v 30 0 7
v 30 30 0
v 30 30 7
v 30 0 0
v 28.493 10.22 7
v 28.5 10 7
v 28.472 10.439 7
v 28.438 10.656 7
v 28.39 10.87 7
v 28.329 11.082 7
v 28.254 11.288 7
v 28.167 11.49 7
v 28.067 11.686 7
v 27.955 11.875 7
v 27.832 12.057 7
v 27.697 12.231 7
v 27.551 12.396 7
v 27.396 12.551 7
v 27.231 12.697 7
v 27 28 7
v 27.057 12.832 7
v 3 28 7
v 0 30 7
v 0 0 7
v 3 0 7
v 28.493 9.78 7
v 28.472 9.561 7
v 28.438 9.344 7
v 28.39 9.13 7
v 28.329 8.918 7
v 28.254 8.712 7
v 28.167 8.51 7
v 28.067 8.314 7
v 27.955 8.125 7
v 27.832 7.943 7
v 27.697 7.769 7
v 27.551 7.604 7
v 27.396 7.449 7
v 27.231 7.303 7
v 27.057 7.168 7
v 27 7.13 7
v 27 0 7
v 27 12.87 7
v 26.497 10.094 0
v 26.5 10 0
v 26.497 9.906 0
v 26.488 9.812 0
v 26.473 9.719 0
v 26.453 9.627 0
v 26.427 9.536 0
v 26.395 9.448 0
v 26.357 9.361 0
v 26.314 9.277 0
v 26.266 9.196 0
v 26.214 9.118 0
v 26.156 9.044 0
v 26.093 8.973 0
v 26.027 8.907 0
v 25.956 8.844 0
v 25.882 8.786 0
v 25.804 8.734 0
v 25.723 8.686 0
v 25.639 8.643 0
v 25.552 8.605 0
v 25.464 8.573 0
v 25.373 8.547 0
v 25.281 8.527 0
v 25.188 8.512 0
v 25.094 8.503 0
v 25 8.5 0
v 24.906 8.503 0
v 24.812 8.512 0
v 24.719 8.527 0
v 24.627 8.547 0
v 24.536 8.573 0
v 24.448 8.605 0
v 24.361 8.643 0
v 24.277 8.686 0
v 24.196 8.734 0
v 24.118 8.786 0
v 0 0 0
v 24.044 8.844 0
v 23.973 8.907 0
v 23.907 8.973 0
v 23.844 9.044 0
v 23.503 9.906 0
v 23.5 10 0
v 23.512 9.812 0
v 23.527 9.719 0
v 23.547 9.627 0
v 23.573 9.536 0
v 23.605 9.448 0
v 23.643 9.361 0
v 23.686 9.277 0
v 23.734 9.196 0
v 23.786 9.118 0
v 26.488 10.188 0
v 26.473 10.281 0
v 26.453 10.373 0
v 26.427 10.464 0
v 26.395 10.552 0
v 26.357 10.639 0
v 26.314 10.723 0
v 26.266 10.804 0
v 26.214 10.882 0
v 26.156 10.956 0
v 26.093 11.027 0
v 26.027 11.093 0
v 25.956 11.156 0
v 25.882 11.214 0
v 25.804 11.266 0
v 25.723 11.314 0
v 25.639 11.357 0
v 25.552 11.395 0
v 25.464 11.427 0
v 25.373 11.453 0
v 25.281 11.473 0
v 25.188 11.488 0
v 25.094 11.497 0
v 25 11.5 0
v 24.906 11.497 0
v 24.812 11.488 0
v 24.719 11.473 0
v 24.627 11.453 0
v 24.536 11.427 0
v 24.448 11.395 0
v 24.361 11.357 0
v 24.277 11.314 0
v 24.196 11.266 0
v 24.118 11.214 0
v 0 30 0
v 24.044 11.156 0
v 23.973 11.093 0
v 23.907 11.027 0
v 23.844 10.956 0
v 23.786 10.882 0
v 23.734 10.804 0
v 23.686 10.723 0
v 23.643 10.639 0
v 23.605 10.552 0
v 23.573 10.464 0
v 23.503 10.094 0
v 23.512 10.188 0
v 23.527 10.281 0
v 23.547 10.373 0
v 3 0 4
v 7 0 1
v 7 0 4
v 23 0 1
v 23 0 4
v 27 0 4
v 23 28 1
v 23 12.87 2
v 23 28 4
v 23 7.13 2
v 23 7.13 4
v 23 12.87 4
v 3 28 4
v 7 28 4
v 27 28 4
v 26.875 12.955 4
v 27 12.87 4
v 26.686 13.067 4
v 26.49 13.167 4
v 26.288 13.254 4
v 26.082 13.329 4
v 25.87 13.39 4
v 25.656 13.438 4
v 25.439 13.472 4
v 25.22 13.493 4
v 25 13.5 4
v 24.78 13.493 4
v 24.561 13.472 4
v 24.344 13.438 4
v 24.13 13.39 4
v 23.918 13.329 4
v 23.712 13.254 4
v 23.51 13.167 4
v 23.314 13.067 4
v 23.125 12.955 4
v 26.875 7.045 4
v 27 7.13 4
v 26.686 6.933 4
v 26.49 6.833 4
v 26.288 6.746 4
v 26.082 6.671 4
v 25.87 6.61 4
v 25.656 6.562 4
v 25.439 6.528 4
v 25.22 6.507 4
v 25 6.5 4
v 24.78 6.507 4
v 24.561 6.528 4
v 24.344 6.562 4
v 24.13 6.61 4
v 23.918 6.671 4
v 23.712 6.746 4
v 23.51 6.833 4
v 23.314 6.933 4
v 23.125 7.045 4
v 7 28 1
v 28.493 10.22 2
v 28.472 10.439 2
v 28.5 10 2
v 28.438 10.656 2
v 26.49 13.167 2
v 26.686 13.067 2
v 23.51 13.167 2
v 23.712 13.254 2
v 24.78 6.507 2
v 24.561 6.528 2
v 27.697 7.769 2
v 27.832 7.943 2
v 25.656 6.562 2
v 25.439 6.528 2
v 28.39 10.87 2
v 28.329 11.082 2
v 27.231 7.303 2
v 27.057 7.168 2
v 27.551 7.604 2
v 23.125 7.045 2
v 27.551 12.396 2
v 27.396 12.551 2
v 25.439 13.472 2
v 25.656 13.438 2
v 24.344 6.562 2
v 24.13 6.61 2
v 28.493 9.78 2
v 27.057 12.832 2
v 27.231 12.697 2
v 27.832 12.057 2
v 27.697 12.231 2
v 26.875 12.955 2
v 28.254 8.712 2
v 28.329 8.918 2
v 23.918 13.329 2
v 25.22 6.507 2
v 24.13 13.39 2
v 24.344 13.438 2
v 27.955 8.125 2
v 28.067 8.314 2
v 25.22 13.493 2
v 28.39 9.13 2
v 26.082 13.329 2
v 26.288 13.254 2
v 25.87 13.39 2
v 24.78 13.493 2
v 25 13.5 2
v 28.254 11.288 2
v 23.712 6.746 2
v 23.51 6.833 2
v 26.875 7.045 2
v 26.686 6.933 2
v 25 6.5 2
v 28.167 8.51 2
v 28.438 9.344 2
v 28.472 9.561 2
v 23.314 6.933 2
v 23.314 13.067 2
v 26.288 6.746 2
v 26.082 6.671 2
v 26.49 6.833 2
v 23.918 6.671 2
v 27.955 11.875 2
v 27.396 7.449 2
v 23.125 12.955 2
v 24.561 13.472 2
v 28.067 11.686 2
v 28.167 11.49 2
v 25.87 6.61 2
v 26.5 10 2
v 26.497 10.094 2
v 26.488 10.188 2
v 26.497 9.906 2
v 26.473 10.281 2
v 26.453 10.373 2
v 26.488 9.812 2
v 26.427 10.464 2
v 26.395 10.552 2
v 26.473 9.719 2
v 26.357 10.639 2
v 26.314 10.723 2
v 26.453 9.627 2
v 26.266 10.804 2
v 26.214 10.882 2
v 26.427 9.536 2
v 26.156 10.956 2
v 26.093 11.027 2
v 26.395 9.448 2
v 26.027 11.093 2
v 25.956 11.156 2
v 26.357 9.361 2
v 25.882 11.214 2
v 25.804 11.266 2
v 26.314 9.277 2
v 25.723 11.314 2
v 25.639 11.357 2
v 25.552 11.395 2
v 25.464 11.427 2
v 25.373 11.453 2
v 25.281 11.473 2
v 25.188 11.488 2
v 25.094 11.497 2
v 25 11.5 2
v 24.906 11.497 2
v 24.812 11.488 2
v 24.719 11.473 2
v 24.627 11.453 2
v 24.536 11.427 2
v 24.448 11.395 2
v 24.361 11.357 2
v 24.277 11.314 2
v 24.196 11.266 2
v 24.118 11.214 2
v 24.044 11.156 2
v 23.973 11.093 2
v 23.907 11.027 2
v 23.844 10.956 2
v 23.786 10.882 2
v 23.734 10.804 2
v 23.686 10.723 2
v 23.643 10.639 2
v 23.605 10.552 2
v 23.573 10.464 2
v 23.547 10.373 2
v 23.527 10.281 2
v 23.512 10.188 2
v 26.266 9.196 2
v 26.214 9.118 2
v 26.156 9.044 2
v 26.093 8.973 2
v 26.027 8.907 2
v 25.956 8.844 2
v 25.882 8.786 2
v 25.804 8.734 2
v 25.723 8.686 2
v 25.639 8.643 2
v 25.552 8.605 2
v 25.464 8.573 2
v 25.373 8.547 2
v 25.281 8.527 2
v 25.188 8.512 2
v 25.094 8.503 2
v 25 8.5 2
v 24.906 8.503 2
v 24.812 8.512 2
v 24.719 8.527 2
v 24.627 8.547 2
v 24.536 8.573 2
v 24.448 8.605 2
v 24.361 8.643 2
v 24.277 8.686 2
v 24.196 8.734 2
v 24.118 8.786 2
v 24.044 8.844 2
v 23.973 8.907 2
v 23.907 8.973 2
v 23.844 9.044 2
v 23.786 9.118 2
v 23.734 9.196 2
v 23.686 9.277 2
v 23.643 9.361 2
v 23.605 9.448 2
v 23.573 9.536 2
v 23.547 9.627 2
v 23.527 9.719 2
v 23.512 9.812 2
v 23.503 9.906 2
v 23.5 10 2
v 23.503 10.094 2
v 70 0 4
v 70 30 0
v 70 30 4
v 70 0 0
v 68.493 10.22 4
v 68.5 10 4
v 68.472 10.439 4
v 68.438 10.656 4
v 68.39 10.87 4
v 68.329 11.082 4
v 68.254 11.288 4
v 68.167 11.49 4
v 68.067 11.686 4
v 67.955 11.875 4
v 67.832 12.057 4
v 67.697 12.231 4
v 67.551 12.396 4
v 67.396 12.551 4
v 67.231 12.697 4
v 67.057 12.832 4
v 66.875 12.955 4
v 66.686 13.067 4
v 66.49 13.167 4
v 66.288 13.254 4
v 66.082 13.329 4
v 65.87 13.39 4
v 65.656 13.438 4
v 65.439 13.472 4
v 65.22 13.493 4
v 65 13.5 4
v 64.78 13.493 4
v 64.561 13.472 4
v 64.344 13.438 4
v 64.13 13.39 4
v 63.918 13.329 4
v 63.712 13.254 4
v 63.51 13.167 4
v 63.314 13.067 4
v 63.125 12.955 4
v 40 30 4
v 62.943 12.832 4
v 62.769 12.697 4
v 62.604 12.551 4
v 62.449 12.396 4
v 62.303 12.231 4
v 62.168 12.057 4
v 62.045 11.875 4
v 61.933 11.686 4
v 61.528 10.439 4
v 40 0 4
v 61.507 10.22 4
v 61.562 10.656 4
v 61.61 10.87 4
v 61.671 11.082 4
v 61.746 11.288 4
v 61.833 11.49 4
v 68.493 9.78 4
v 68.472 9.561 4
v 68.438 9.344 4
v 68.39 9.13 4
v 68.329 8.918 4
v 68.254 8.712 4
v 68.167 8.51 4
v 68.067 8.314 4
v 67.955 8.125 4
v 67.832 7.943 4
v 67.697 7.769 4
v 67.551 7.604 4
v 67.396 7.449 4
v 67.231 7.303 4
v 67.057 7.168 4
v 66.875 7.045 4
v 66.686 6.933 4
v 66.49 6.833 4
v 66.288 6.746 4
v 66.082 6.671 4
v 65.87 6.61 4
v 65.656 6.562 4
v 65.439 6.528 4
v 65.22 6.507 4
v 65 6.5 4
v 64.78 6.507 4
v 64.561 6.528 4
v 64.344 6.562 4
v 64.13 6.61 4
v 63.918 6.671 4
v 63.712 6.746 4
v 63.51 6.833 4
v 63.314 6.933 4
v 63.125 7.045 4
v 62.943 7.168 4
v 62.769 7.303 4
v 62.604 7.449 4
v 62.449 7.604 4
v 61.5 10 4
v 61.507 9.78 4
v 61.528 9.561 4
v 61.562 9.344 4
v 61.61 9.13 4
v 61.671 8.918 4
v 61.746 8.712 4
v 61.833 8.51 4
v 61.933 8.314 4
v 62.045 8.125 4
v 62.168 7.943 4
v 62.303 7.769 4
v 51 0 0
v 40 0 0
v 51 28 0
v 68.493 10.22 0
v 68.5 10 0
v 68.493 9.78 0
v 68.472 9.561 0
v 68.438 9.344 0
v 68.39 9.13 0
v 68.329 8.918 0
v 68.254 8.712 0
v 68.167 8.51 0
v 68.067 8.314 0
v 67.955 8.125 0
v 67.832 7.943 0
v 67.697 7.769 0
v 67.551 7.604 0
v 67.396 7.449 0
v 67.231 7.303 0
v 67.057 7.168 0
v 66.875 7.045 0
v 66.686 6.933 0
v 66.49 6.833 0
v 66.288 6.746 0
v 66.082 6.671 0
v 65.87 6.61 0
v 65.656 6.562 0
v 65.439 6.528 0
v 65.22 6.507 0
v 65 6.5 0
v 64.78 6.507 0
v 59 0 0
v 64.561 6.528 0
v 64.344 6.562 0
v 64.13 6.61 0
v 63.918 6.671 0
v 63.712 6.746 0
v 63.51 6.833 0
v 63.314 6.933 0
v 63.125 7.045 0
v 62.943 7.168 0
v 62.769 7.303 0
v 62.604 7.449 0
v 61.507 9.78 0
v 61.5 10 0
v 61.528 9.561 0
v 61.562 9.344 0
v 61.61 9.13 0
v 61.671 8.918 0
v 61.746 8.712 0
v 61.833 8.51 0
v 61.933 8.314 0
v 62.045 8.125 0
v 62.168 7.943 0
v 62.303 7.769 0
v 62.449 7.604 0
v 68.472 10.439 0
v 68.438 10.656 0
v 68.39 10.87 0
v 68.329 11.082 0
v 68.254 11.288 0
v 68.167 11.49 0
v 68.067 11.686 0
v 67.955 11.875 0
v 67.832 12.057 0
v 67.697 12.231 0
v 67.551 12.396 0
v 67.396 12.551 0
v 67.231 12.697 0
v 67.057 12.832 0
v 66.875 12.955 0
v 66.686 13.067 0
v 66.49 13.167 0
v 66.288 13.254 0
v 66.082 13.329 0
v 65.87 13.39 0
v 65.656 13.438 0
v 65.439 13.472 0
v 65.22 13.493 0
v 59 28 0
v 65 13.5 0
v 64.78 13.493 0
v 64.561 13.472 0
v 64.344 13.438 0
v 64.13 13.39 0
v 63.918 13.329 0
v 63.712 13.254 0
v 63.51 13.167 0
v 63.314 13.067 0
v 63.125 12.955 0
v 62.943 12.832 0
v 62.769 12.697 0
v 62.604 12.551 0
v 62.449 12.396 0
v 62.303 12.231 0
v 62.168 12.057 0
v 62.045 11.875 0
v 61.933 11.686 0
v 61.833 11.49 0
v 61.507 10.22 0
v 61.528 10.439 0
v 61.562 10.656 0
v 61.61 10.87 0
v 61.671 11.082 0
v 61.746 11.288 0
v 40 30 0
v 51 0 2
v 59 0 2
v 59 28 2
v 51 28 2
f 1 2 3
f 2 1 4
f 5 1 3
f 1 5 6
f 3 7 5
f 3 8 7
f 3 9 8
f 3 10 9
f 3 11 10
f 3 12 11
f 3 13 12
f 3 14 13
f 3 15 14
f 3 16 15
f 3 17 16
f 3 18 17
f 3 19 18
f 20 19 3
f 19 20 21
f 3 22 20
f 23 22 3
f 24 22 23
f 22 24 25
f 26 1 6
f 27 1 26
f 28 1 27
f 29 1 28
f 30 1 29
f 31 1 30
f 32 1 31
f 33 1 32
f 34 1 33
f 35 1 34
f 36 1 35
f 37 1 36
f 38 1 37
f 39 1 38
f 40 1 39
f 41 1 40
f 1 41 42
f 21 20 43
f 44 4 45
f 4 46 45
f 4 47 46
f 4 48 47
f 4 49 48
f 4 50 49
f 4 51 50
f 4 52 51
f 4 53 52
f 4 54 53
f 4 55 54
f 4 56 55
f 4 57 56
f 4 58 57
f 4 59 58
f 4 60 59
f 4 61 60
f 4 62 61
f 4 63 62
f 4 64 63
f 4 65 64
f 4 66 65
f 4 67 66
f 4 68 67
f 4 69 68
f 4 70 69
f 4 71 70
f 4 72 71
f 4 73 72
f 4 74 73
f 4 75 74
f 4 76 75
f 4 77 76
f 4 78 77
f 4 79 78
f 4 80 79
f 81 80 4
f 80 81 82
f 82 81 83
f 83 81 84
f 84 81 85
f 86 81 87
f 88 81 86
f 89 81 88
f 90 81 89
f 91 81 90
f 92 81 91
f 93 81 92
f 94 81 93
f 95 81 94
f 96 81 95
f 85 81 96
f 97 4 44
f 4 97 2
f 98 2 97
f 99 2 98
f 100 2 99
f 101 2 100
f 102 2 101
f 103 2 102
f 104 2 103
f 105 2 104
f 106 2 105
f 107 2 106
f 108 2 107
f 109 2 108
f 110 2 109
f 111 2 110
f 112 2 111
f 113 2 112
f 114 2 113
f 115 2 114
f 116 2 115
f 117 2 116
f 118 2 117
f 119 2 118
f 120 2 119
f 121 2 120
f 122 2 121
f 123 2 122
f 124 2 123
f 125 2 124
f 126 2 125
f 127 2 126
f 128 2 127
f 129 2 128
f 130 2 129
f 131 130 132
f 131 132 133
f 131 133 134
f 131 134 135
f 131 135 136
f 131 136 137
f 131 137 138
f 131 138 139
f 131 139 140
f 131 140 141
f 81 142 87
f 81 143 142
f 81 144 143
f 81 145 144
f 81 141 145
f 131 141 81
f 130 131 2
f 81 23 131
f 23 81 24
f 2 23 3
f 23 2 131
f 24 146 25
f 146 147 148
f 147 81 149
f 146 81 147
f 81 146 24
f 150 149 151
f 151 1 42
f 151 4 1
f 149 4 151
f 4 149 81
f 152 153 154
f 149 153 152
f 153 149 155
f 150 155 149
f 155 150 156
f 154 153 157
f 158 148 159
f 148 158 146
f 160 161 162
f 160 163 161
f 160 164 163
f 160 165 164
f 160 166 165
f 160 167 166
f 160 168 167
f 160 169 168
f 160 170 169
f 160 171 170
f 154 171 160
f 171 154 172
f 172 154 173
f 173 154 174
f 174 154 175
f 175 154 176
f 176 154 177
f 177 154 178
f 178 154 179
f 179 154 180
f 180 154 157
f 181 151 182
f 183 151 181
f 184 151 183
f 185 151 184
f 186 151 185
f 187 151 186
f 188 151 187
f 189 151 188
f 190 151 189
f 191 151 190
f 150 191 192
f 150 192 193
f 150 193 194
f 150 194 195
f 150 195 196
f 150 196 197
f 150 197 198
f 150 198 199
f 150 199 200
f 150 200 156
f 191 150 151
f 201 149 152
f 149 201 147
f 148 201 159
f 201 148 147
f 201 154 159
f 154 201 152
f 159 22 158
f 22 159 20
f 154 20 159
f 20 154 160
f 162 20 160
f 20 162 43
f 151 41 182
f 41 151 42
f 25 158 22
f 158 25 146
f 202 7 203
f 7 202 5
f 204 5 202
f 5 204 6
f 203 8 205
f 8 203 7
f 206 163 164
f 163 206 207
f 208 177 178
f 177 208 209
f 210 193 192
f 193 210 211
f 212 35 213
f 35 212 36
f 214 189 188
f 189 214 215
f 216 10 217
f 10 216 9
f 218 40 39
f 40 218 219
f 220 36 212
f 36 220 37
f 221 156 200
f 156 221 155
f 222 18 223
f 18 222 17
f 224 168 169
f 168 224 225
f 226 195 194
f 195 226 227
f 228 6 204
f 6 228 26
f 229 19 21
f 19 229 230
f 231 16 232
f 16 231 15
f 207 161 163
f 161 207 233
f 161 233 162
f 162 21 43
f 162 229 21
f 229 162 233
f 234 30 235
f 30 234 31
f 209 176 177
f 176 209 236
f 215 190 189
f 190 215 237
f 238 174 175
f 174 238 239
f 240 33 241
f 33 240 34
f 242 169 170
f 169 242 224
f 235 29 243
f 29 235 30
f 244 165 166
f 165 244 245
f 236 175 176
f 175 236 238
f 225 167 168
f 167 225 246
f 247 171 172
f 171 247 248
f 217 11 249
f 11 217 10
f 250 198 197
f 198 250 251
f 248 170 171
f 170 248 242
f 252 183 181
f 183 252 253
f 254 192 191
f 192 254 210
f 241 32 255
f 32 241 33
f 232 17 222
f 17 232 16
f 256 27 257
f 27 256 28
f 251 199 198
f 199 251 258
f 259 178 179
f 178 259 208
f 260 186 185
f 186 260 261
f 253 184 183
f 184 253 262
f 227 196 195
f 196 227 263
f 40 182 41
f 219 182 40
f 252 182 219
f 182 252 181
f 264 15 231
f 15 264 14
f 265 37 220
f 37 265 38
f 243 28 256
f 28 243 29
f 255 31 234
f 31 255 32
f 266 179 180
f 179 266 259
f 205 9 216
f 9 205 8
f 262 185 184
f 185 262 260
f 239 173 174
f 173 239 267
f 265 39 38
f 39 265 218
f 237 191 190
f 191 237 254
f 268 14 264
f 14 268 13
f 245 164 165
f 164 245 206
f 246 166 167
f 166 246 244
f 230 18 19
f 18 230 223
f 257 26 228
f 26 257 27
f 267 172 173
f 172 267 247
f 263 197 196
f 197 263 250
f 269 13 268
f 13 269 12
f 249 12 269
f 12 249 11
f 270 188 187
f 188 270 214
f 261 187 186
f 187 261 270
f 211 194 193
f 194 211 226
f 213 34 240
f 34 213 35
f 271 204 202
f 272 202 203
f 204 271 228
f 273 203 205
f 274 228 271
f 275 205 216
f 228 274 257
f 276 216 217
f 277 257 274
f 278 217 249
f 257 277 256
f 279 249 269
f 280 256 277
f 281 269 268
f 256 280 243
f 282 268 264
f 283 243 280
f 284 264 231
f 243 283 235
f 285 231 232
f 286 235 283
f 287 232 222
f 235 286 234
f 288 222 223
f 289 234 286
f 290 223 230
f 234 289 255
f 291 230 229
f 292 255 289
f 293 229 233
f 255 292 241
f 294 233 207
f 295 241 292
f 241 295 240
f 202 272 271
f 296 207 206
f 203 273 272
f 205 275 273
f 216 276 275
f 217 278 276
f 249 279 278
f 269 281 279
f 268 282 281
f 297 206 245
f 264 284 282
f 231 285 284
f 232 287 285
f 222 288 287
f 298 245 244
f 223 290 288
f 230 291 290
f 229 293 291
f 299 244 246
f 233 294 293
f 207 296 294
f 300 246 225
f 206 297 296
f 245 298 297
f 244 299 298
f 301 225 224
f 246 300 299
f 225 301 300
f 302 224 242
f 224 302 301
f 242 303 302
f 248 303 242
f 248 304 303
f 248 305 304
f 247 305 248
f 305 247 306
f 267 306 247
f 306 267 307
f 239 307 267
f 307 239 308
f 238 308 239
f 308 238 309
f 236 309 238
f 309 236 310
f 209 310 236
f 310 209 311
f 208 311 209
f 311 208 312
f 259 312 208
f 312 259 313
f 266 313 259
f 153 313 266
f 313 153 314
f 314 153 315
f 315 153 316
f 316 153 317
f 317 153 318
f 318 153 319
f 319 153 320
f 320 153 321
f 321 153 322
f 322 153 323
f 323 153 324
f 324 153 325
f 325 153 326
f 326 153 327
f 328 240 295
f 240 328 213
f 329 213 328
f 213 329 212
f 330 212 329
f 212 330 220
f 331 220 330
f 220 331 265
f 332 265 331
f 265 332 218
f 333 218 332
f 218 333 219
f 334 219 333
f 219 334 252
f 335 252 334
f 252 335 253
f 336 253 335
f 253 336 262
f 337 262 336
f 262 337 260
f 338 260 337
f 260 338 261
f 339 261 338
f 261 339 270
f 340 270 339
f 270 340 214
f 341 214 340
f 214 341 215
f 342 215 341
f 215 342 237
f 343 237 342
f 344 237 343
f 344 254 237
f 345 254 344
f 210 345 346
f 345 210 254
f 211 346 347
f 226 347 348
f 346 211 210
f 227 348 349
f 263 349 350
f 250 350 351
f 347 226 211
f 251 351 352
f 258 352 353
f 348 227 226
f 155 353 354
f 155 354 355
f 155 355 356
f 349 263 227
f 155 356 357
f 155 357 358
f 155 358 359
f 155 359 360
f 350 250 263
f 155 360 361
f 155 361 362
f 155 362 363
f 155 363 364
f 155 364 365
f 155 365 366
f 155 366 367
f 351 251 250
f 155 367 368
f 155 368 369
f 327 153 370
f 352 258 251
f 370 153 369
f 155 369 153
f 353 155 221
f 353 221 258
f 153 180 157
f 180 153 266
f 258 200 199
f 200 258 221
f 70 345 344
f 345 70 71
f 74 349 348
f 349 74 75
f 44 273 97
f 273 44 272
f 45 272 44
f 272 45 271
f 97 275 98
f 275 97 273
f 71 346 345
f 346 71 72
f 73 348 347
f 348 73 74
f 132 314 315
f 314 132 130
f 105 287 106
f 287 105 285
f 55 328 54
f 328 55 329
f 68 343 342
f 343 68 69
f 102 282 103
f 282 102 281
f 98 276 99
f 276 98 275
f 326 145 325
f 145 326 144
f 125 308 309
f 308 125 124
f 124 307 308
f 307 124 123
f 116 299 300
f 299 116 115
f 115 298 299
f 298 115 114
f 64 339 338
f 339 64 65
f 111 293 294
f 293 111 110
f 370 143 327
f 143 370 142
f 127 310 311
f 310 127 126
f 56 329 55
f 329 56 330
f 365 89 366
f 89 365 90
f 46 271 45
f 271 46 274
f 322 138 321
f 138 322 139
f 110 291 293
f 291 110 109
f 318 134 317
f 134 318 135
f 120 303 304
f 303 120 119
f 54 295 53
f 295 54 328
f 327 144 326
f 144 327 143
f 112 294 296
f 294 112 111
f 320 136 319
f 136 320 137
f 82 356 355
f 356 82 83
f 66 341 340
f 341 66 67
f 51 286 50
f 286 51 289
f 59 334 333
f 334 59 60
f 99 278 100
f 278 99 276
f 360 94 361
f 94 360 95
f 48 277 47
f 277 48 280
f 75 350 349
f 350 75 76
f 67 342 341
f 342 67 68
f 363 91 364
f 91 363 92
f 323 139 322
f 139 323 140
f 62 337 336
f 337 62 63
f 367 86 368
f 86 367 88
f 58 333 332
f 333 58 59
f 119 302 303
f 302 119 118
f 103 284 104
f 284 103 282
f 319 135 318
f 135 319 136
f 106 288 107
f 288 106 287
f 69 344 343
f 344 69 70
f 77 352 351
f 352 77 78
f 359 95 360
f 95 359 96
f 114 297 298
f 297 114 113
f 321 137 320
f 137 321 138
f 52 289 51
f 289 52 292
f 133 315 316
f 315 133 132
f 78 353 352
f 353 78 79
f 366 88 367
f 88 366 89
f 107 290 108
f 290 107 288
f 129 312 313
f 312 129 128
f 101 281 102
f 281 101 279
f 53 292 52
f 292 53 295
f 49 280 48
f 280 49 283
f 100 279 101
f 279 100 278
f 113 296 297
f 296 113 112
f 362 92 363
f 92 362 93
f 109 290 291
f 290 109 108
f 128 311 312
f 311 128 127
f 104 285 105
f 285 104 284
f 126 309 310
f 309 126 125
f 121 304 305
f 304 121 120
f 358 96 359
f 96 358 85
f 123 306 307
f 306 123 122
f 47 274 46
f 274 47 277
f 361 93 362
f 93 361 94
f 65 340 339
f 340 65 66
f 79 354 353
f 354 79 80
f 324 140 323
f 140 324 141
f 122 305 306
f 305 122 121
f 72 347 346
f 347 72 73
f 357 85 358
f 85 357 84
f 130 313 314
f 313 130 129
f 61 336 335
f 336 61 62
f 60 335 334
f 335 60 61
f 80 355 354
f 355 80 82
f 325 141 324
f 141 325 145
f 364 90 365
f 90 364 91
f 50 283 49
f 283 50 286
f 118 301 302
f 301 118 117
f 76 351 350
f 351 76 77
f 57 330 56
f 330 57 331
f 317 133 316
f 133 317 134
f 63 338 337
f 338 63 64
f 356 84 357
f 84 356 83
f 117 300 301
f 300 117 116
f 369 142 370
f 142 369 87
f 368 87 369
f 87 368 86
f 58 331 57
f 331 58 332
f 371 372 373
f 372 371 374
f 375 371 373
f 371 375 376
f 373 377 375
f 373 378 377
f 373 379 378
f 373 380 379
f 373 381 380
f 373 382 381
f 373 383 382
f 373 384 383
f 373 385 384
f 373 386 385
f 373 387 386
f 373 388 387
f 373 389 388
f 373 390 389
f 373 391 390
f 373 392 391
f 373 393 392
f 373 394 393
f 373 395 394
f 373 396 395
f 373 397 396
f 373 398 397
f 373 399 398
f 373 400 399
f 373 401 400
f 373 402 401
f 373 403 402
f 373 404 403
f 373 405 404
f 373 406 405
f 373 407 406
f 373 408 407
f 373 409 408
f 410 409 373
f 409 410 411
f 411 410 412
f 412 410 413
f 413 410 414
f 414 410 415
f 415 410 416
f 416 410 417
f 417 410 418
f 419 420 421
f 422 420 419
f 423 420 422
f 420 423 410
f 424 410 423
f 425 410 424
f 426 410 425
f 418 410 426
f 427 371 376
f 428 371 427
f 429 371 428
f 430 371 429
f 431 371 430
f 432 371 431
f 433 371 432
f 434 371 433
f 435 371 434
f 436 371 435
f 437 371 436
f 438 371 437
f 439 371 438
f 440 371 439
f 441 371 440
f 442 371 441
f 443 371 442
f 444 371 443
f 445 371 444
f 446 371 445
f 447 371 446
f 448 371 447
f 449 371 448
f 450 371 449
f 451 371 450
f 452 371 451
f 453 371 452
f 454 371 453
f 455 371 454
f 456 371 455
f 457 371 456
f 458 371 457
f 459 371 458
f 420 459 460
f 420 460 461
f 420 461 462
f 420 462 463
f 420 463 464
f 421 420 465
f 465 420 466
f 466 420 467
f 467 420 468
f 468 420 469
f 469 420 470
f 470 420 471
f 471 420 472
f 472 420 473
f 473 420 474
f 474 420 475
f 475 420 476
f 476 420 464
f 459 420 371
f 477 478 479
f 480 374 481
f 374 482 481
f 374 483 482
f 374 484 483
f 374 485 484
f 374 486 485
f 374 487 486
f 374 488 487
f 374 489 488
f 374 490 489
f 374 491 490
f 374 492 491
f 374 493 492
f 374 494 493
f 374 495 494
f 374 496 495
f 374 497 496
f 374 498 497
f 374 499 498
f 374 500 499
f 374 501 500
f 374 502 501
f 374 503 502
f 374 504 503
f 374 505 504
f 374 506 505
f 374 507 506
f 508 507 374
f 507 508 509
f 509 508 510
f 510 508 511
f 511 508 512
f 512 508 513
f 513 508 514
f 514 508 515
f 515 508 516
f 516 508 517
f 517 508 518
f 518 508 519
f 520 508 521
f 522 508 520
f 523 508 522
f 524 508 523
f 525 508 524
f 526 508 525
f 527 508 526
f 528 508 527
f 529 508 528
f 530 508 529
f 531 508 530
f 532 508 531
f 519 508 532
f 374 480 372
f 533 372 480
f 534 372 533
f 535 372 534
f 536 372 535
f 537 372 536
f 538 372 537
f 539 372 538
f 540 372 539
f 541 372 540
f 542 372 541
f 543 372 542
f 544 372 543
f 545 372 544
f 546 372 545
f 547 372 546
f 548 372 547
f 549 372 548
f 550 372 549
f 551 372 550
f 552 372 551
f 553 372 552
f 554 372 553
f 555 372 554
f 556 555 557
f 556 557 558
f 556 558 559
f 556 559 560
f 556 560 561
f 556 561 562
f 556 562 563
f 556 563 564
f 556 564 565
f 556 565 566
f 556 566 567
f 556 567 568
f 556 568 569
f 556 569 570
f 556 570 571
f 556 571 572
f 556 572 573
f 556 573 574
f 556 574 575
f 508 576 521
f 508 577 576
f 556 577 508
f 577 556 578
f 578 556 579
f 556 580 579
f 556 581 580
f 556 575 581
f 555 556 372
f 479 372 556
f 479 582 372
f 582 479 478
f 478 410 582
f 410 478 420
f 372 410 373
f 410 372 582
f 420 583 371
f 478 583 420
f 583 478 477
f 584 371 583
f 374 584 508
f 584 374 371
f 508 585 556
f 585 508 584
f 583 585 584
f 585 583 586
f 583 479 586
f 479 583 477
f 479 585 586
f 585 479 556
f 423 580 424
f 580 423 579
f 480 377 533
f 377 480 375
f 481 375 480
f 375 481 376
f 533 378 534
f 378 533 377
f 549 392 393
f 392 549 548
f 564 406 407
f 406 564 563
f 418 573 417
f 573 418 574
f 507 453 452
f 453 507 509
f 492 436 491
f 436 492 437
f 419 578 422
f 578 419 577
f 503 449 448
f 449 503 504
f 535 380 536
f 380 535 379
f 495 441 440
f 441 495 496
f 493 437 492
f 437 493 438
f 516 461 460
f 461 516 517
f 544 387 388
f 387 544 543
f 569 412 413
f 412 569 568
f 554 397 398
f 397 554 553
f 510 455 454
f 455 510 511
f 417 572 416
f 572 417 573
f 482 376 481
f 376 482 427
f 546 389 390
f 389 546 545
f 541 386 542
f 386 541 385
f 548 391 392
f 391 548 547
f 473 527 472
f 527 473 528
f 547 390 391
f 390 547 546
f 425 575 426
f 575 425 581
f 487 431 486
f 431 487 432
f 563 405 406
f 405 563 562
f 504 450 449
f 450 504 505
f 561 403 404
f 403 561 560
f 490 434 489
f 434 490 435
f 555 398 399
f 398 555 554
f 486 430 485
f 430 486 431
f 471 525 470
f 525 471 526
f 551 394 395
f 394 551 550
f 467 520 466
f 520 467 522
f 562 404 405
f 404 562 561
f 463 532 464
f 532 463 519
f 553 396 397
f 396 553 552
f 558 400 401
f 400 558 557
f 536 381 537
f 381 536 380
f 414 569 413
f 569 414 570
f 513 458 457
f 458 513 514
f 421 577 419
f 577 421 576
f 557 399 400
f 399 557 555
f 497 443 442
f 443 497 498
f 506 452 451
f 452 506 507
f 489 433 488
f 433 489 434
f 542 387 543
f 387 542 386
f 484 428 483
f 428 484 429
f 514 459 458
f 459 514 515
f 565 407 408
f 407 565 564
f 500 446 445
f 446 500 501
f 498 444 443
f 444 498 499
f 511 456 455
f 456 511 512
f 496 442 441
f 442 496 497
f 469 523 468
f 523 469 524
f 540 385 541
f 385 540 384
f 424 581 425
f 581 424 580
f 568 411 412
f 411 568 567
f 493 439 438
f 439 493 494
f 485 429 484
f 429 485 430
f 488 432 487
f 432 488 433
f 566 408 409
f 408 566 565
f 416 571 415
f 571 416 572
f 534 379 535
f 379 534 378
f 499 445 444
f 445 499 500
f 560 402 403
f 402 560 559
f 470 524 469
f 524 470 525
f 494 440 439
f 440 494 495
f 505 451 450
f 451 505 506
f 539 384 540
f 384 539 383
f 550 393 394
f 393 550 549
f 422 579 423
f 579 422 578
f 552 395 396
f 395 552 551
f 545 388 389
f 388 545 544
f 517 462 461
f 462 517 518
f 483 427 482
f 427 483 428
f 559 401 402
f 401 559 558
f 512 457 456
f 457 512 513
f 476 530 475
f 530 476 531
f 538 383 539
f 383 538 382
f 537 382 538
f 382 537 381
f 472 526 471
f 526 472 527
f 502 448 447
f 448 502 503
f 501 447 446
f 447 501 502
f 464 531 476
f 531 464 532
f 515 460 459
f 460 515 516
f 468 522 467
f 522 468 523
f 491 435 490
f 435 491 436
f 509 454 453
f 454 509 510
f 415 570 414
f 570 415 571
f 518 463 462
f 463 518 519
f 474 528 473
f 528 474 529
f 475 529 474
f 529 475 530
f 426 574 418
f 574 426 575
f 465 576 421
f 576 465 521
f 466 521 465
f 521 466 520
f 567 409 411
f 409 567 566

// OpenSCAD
$fn = 100;
difference(){
    union(){
        difference () {
            cube([30,30,7]);
            translate([7,0,1])cube([16,28,3]);
            translate([3,0,4])cube([24,28,4]);
        }

        //translate([-10,12.5,0])cube([15,15,2]);
    }
    color("red") translate([25,10,7]) cylinder(10,d=7, center=true);
    color("blue") translate([25,10,0]) cylinder(35,d=3, center=true);
}

difference(){
       //rotate([0,180,0])
        translate ([40,0,-5.5])difference () {
            translate([0,0,5.5])cube([30,30,4]);
            translate([11,0,5.5])cube([8,28,2]);
        }
    translate ([40,0,-5.5]){
        color("red") translate([25,10,7]) cylinder(10,d=7, center=true);
        color("blue") translate([25,10,0]) cylinder(35,d=3, center=true);
    }
}
            
